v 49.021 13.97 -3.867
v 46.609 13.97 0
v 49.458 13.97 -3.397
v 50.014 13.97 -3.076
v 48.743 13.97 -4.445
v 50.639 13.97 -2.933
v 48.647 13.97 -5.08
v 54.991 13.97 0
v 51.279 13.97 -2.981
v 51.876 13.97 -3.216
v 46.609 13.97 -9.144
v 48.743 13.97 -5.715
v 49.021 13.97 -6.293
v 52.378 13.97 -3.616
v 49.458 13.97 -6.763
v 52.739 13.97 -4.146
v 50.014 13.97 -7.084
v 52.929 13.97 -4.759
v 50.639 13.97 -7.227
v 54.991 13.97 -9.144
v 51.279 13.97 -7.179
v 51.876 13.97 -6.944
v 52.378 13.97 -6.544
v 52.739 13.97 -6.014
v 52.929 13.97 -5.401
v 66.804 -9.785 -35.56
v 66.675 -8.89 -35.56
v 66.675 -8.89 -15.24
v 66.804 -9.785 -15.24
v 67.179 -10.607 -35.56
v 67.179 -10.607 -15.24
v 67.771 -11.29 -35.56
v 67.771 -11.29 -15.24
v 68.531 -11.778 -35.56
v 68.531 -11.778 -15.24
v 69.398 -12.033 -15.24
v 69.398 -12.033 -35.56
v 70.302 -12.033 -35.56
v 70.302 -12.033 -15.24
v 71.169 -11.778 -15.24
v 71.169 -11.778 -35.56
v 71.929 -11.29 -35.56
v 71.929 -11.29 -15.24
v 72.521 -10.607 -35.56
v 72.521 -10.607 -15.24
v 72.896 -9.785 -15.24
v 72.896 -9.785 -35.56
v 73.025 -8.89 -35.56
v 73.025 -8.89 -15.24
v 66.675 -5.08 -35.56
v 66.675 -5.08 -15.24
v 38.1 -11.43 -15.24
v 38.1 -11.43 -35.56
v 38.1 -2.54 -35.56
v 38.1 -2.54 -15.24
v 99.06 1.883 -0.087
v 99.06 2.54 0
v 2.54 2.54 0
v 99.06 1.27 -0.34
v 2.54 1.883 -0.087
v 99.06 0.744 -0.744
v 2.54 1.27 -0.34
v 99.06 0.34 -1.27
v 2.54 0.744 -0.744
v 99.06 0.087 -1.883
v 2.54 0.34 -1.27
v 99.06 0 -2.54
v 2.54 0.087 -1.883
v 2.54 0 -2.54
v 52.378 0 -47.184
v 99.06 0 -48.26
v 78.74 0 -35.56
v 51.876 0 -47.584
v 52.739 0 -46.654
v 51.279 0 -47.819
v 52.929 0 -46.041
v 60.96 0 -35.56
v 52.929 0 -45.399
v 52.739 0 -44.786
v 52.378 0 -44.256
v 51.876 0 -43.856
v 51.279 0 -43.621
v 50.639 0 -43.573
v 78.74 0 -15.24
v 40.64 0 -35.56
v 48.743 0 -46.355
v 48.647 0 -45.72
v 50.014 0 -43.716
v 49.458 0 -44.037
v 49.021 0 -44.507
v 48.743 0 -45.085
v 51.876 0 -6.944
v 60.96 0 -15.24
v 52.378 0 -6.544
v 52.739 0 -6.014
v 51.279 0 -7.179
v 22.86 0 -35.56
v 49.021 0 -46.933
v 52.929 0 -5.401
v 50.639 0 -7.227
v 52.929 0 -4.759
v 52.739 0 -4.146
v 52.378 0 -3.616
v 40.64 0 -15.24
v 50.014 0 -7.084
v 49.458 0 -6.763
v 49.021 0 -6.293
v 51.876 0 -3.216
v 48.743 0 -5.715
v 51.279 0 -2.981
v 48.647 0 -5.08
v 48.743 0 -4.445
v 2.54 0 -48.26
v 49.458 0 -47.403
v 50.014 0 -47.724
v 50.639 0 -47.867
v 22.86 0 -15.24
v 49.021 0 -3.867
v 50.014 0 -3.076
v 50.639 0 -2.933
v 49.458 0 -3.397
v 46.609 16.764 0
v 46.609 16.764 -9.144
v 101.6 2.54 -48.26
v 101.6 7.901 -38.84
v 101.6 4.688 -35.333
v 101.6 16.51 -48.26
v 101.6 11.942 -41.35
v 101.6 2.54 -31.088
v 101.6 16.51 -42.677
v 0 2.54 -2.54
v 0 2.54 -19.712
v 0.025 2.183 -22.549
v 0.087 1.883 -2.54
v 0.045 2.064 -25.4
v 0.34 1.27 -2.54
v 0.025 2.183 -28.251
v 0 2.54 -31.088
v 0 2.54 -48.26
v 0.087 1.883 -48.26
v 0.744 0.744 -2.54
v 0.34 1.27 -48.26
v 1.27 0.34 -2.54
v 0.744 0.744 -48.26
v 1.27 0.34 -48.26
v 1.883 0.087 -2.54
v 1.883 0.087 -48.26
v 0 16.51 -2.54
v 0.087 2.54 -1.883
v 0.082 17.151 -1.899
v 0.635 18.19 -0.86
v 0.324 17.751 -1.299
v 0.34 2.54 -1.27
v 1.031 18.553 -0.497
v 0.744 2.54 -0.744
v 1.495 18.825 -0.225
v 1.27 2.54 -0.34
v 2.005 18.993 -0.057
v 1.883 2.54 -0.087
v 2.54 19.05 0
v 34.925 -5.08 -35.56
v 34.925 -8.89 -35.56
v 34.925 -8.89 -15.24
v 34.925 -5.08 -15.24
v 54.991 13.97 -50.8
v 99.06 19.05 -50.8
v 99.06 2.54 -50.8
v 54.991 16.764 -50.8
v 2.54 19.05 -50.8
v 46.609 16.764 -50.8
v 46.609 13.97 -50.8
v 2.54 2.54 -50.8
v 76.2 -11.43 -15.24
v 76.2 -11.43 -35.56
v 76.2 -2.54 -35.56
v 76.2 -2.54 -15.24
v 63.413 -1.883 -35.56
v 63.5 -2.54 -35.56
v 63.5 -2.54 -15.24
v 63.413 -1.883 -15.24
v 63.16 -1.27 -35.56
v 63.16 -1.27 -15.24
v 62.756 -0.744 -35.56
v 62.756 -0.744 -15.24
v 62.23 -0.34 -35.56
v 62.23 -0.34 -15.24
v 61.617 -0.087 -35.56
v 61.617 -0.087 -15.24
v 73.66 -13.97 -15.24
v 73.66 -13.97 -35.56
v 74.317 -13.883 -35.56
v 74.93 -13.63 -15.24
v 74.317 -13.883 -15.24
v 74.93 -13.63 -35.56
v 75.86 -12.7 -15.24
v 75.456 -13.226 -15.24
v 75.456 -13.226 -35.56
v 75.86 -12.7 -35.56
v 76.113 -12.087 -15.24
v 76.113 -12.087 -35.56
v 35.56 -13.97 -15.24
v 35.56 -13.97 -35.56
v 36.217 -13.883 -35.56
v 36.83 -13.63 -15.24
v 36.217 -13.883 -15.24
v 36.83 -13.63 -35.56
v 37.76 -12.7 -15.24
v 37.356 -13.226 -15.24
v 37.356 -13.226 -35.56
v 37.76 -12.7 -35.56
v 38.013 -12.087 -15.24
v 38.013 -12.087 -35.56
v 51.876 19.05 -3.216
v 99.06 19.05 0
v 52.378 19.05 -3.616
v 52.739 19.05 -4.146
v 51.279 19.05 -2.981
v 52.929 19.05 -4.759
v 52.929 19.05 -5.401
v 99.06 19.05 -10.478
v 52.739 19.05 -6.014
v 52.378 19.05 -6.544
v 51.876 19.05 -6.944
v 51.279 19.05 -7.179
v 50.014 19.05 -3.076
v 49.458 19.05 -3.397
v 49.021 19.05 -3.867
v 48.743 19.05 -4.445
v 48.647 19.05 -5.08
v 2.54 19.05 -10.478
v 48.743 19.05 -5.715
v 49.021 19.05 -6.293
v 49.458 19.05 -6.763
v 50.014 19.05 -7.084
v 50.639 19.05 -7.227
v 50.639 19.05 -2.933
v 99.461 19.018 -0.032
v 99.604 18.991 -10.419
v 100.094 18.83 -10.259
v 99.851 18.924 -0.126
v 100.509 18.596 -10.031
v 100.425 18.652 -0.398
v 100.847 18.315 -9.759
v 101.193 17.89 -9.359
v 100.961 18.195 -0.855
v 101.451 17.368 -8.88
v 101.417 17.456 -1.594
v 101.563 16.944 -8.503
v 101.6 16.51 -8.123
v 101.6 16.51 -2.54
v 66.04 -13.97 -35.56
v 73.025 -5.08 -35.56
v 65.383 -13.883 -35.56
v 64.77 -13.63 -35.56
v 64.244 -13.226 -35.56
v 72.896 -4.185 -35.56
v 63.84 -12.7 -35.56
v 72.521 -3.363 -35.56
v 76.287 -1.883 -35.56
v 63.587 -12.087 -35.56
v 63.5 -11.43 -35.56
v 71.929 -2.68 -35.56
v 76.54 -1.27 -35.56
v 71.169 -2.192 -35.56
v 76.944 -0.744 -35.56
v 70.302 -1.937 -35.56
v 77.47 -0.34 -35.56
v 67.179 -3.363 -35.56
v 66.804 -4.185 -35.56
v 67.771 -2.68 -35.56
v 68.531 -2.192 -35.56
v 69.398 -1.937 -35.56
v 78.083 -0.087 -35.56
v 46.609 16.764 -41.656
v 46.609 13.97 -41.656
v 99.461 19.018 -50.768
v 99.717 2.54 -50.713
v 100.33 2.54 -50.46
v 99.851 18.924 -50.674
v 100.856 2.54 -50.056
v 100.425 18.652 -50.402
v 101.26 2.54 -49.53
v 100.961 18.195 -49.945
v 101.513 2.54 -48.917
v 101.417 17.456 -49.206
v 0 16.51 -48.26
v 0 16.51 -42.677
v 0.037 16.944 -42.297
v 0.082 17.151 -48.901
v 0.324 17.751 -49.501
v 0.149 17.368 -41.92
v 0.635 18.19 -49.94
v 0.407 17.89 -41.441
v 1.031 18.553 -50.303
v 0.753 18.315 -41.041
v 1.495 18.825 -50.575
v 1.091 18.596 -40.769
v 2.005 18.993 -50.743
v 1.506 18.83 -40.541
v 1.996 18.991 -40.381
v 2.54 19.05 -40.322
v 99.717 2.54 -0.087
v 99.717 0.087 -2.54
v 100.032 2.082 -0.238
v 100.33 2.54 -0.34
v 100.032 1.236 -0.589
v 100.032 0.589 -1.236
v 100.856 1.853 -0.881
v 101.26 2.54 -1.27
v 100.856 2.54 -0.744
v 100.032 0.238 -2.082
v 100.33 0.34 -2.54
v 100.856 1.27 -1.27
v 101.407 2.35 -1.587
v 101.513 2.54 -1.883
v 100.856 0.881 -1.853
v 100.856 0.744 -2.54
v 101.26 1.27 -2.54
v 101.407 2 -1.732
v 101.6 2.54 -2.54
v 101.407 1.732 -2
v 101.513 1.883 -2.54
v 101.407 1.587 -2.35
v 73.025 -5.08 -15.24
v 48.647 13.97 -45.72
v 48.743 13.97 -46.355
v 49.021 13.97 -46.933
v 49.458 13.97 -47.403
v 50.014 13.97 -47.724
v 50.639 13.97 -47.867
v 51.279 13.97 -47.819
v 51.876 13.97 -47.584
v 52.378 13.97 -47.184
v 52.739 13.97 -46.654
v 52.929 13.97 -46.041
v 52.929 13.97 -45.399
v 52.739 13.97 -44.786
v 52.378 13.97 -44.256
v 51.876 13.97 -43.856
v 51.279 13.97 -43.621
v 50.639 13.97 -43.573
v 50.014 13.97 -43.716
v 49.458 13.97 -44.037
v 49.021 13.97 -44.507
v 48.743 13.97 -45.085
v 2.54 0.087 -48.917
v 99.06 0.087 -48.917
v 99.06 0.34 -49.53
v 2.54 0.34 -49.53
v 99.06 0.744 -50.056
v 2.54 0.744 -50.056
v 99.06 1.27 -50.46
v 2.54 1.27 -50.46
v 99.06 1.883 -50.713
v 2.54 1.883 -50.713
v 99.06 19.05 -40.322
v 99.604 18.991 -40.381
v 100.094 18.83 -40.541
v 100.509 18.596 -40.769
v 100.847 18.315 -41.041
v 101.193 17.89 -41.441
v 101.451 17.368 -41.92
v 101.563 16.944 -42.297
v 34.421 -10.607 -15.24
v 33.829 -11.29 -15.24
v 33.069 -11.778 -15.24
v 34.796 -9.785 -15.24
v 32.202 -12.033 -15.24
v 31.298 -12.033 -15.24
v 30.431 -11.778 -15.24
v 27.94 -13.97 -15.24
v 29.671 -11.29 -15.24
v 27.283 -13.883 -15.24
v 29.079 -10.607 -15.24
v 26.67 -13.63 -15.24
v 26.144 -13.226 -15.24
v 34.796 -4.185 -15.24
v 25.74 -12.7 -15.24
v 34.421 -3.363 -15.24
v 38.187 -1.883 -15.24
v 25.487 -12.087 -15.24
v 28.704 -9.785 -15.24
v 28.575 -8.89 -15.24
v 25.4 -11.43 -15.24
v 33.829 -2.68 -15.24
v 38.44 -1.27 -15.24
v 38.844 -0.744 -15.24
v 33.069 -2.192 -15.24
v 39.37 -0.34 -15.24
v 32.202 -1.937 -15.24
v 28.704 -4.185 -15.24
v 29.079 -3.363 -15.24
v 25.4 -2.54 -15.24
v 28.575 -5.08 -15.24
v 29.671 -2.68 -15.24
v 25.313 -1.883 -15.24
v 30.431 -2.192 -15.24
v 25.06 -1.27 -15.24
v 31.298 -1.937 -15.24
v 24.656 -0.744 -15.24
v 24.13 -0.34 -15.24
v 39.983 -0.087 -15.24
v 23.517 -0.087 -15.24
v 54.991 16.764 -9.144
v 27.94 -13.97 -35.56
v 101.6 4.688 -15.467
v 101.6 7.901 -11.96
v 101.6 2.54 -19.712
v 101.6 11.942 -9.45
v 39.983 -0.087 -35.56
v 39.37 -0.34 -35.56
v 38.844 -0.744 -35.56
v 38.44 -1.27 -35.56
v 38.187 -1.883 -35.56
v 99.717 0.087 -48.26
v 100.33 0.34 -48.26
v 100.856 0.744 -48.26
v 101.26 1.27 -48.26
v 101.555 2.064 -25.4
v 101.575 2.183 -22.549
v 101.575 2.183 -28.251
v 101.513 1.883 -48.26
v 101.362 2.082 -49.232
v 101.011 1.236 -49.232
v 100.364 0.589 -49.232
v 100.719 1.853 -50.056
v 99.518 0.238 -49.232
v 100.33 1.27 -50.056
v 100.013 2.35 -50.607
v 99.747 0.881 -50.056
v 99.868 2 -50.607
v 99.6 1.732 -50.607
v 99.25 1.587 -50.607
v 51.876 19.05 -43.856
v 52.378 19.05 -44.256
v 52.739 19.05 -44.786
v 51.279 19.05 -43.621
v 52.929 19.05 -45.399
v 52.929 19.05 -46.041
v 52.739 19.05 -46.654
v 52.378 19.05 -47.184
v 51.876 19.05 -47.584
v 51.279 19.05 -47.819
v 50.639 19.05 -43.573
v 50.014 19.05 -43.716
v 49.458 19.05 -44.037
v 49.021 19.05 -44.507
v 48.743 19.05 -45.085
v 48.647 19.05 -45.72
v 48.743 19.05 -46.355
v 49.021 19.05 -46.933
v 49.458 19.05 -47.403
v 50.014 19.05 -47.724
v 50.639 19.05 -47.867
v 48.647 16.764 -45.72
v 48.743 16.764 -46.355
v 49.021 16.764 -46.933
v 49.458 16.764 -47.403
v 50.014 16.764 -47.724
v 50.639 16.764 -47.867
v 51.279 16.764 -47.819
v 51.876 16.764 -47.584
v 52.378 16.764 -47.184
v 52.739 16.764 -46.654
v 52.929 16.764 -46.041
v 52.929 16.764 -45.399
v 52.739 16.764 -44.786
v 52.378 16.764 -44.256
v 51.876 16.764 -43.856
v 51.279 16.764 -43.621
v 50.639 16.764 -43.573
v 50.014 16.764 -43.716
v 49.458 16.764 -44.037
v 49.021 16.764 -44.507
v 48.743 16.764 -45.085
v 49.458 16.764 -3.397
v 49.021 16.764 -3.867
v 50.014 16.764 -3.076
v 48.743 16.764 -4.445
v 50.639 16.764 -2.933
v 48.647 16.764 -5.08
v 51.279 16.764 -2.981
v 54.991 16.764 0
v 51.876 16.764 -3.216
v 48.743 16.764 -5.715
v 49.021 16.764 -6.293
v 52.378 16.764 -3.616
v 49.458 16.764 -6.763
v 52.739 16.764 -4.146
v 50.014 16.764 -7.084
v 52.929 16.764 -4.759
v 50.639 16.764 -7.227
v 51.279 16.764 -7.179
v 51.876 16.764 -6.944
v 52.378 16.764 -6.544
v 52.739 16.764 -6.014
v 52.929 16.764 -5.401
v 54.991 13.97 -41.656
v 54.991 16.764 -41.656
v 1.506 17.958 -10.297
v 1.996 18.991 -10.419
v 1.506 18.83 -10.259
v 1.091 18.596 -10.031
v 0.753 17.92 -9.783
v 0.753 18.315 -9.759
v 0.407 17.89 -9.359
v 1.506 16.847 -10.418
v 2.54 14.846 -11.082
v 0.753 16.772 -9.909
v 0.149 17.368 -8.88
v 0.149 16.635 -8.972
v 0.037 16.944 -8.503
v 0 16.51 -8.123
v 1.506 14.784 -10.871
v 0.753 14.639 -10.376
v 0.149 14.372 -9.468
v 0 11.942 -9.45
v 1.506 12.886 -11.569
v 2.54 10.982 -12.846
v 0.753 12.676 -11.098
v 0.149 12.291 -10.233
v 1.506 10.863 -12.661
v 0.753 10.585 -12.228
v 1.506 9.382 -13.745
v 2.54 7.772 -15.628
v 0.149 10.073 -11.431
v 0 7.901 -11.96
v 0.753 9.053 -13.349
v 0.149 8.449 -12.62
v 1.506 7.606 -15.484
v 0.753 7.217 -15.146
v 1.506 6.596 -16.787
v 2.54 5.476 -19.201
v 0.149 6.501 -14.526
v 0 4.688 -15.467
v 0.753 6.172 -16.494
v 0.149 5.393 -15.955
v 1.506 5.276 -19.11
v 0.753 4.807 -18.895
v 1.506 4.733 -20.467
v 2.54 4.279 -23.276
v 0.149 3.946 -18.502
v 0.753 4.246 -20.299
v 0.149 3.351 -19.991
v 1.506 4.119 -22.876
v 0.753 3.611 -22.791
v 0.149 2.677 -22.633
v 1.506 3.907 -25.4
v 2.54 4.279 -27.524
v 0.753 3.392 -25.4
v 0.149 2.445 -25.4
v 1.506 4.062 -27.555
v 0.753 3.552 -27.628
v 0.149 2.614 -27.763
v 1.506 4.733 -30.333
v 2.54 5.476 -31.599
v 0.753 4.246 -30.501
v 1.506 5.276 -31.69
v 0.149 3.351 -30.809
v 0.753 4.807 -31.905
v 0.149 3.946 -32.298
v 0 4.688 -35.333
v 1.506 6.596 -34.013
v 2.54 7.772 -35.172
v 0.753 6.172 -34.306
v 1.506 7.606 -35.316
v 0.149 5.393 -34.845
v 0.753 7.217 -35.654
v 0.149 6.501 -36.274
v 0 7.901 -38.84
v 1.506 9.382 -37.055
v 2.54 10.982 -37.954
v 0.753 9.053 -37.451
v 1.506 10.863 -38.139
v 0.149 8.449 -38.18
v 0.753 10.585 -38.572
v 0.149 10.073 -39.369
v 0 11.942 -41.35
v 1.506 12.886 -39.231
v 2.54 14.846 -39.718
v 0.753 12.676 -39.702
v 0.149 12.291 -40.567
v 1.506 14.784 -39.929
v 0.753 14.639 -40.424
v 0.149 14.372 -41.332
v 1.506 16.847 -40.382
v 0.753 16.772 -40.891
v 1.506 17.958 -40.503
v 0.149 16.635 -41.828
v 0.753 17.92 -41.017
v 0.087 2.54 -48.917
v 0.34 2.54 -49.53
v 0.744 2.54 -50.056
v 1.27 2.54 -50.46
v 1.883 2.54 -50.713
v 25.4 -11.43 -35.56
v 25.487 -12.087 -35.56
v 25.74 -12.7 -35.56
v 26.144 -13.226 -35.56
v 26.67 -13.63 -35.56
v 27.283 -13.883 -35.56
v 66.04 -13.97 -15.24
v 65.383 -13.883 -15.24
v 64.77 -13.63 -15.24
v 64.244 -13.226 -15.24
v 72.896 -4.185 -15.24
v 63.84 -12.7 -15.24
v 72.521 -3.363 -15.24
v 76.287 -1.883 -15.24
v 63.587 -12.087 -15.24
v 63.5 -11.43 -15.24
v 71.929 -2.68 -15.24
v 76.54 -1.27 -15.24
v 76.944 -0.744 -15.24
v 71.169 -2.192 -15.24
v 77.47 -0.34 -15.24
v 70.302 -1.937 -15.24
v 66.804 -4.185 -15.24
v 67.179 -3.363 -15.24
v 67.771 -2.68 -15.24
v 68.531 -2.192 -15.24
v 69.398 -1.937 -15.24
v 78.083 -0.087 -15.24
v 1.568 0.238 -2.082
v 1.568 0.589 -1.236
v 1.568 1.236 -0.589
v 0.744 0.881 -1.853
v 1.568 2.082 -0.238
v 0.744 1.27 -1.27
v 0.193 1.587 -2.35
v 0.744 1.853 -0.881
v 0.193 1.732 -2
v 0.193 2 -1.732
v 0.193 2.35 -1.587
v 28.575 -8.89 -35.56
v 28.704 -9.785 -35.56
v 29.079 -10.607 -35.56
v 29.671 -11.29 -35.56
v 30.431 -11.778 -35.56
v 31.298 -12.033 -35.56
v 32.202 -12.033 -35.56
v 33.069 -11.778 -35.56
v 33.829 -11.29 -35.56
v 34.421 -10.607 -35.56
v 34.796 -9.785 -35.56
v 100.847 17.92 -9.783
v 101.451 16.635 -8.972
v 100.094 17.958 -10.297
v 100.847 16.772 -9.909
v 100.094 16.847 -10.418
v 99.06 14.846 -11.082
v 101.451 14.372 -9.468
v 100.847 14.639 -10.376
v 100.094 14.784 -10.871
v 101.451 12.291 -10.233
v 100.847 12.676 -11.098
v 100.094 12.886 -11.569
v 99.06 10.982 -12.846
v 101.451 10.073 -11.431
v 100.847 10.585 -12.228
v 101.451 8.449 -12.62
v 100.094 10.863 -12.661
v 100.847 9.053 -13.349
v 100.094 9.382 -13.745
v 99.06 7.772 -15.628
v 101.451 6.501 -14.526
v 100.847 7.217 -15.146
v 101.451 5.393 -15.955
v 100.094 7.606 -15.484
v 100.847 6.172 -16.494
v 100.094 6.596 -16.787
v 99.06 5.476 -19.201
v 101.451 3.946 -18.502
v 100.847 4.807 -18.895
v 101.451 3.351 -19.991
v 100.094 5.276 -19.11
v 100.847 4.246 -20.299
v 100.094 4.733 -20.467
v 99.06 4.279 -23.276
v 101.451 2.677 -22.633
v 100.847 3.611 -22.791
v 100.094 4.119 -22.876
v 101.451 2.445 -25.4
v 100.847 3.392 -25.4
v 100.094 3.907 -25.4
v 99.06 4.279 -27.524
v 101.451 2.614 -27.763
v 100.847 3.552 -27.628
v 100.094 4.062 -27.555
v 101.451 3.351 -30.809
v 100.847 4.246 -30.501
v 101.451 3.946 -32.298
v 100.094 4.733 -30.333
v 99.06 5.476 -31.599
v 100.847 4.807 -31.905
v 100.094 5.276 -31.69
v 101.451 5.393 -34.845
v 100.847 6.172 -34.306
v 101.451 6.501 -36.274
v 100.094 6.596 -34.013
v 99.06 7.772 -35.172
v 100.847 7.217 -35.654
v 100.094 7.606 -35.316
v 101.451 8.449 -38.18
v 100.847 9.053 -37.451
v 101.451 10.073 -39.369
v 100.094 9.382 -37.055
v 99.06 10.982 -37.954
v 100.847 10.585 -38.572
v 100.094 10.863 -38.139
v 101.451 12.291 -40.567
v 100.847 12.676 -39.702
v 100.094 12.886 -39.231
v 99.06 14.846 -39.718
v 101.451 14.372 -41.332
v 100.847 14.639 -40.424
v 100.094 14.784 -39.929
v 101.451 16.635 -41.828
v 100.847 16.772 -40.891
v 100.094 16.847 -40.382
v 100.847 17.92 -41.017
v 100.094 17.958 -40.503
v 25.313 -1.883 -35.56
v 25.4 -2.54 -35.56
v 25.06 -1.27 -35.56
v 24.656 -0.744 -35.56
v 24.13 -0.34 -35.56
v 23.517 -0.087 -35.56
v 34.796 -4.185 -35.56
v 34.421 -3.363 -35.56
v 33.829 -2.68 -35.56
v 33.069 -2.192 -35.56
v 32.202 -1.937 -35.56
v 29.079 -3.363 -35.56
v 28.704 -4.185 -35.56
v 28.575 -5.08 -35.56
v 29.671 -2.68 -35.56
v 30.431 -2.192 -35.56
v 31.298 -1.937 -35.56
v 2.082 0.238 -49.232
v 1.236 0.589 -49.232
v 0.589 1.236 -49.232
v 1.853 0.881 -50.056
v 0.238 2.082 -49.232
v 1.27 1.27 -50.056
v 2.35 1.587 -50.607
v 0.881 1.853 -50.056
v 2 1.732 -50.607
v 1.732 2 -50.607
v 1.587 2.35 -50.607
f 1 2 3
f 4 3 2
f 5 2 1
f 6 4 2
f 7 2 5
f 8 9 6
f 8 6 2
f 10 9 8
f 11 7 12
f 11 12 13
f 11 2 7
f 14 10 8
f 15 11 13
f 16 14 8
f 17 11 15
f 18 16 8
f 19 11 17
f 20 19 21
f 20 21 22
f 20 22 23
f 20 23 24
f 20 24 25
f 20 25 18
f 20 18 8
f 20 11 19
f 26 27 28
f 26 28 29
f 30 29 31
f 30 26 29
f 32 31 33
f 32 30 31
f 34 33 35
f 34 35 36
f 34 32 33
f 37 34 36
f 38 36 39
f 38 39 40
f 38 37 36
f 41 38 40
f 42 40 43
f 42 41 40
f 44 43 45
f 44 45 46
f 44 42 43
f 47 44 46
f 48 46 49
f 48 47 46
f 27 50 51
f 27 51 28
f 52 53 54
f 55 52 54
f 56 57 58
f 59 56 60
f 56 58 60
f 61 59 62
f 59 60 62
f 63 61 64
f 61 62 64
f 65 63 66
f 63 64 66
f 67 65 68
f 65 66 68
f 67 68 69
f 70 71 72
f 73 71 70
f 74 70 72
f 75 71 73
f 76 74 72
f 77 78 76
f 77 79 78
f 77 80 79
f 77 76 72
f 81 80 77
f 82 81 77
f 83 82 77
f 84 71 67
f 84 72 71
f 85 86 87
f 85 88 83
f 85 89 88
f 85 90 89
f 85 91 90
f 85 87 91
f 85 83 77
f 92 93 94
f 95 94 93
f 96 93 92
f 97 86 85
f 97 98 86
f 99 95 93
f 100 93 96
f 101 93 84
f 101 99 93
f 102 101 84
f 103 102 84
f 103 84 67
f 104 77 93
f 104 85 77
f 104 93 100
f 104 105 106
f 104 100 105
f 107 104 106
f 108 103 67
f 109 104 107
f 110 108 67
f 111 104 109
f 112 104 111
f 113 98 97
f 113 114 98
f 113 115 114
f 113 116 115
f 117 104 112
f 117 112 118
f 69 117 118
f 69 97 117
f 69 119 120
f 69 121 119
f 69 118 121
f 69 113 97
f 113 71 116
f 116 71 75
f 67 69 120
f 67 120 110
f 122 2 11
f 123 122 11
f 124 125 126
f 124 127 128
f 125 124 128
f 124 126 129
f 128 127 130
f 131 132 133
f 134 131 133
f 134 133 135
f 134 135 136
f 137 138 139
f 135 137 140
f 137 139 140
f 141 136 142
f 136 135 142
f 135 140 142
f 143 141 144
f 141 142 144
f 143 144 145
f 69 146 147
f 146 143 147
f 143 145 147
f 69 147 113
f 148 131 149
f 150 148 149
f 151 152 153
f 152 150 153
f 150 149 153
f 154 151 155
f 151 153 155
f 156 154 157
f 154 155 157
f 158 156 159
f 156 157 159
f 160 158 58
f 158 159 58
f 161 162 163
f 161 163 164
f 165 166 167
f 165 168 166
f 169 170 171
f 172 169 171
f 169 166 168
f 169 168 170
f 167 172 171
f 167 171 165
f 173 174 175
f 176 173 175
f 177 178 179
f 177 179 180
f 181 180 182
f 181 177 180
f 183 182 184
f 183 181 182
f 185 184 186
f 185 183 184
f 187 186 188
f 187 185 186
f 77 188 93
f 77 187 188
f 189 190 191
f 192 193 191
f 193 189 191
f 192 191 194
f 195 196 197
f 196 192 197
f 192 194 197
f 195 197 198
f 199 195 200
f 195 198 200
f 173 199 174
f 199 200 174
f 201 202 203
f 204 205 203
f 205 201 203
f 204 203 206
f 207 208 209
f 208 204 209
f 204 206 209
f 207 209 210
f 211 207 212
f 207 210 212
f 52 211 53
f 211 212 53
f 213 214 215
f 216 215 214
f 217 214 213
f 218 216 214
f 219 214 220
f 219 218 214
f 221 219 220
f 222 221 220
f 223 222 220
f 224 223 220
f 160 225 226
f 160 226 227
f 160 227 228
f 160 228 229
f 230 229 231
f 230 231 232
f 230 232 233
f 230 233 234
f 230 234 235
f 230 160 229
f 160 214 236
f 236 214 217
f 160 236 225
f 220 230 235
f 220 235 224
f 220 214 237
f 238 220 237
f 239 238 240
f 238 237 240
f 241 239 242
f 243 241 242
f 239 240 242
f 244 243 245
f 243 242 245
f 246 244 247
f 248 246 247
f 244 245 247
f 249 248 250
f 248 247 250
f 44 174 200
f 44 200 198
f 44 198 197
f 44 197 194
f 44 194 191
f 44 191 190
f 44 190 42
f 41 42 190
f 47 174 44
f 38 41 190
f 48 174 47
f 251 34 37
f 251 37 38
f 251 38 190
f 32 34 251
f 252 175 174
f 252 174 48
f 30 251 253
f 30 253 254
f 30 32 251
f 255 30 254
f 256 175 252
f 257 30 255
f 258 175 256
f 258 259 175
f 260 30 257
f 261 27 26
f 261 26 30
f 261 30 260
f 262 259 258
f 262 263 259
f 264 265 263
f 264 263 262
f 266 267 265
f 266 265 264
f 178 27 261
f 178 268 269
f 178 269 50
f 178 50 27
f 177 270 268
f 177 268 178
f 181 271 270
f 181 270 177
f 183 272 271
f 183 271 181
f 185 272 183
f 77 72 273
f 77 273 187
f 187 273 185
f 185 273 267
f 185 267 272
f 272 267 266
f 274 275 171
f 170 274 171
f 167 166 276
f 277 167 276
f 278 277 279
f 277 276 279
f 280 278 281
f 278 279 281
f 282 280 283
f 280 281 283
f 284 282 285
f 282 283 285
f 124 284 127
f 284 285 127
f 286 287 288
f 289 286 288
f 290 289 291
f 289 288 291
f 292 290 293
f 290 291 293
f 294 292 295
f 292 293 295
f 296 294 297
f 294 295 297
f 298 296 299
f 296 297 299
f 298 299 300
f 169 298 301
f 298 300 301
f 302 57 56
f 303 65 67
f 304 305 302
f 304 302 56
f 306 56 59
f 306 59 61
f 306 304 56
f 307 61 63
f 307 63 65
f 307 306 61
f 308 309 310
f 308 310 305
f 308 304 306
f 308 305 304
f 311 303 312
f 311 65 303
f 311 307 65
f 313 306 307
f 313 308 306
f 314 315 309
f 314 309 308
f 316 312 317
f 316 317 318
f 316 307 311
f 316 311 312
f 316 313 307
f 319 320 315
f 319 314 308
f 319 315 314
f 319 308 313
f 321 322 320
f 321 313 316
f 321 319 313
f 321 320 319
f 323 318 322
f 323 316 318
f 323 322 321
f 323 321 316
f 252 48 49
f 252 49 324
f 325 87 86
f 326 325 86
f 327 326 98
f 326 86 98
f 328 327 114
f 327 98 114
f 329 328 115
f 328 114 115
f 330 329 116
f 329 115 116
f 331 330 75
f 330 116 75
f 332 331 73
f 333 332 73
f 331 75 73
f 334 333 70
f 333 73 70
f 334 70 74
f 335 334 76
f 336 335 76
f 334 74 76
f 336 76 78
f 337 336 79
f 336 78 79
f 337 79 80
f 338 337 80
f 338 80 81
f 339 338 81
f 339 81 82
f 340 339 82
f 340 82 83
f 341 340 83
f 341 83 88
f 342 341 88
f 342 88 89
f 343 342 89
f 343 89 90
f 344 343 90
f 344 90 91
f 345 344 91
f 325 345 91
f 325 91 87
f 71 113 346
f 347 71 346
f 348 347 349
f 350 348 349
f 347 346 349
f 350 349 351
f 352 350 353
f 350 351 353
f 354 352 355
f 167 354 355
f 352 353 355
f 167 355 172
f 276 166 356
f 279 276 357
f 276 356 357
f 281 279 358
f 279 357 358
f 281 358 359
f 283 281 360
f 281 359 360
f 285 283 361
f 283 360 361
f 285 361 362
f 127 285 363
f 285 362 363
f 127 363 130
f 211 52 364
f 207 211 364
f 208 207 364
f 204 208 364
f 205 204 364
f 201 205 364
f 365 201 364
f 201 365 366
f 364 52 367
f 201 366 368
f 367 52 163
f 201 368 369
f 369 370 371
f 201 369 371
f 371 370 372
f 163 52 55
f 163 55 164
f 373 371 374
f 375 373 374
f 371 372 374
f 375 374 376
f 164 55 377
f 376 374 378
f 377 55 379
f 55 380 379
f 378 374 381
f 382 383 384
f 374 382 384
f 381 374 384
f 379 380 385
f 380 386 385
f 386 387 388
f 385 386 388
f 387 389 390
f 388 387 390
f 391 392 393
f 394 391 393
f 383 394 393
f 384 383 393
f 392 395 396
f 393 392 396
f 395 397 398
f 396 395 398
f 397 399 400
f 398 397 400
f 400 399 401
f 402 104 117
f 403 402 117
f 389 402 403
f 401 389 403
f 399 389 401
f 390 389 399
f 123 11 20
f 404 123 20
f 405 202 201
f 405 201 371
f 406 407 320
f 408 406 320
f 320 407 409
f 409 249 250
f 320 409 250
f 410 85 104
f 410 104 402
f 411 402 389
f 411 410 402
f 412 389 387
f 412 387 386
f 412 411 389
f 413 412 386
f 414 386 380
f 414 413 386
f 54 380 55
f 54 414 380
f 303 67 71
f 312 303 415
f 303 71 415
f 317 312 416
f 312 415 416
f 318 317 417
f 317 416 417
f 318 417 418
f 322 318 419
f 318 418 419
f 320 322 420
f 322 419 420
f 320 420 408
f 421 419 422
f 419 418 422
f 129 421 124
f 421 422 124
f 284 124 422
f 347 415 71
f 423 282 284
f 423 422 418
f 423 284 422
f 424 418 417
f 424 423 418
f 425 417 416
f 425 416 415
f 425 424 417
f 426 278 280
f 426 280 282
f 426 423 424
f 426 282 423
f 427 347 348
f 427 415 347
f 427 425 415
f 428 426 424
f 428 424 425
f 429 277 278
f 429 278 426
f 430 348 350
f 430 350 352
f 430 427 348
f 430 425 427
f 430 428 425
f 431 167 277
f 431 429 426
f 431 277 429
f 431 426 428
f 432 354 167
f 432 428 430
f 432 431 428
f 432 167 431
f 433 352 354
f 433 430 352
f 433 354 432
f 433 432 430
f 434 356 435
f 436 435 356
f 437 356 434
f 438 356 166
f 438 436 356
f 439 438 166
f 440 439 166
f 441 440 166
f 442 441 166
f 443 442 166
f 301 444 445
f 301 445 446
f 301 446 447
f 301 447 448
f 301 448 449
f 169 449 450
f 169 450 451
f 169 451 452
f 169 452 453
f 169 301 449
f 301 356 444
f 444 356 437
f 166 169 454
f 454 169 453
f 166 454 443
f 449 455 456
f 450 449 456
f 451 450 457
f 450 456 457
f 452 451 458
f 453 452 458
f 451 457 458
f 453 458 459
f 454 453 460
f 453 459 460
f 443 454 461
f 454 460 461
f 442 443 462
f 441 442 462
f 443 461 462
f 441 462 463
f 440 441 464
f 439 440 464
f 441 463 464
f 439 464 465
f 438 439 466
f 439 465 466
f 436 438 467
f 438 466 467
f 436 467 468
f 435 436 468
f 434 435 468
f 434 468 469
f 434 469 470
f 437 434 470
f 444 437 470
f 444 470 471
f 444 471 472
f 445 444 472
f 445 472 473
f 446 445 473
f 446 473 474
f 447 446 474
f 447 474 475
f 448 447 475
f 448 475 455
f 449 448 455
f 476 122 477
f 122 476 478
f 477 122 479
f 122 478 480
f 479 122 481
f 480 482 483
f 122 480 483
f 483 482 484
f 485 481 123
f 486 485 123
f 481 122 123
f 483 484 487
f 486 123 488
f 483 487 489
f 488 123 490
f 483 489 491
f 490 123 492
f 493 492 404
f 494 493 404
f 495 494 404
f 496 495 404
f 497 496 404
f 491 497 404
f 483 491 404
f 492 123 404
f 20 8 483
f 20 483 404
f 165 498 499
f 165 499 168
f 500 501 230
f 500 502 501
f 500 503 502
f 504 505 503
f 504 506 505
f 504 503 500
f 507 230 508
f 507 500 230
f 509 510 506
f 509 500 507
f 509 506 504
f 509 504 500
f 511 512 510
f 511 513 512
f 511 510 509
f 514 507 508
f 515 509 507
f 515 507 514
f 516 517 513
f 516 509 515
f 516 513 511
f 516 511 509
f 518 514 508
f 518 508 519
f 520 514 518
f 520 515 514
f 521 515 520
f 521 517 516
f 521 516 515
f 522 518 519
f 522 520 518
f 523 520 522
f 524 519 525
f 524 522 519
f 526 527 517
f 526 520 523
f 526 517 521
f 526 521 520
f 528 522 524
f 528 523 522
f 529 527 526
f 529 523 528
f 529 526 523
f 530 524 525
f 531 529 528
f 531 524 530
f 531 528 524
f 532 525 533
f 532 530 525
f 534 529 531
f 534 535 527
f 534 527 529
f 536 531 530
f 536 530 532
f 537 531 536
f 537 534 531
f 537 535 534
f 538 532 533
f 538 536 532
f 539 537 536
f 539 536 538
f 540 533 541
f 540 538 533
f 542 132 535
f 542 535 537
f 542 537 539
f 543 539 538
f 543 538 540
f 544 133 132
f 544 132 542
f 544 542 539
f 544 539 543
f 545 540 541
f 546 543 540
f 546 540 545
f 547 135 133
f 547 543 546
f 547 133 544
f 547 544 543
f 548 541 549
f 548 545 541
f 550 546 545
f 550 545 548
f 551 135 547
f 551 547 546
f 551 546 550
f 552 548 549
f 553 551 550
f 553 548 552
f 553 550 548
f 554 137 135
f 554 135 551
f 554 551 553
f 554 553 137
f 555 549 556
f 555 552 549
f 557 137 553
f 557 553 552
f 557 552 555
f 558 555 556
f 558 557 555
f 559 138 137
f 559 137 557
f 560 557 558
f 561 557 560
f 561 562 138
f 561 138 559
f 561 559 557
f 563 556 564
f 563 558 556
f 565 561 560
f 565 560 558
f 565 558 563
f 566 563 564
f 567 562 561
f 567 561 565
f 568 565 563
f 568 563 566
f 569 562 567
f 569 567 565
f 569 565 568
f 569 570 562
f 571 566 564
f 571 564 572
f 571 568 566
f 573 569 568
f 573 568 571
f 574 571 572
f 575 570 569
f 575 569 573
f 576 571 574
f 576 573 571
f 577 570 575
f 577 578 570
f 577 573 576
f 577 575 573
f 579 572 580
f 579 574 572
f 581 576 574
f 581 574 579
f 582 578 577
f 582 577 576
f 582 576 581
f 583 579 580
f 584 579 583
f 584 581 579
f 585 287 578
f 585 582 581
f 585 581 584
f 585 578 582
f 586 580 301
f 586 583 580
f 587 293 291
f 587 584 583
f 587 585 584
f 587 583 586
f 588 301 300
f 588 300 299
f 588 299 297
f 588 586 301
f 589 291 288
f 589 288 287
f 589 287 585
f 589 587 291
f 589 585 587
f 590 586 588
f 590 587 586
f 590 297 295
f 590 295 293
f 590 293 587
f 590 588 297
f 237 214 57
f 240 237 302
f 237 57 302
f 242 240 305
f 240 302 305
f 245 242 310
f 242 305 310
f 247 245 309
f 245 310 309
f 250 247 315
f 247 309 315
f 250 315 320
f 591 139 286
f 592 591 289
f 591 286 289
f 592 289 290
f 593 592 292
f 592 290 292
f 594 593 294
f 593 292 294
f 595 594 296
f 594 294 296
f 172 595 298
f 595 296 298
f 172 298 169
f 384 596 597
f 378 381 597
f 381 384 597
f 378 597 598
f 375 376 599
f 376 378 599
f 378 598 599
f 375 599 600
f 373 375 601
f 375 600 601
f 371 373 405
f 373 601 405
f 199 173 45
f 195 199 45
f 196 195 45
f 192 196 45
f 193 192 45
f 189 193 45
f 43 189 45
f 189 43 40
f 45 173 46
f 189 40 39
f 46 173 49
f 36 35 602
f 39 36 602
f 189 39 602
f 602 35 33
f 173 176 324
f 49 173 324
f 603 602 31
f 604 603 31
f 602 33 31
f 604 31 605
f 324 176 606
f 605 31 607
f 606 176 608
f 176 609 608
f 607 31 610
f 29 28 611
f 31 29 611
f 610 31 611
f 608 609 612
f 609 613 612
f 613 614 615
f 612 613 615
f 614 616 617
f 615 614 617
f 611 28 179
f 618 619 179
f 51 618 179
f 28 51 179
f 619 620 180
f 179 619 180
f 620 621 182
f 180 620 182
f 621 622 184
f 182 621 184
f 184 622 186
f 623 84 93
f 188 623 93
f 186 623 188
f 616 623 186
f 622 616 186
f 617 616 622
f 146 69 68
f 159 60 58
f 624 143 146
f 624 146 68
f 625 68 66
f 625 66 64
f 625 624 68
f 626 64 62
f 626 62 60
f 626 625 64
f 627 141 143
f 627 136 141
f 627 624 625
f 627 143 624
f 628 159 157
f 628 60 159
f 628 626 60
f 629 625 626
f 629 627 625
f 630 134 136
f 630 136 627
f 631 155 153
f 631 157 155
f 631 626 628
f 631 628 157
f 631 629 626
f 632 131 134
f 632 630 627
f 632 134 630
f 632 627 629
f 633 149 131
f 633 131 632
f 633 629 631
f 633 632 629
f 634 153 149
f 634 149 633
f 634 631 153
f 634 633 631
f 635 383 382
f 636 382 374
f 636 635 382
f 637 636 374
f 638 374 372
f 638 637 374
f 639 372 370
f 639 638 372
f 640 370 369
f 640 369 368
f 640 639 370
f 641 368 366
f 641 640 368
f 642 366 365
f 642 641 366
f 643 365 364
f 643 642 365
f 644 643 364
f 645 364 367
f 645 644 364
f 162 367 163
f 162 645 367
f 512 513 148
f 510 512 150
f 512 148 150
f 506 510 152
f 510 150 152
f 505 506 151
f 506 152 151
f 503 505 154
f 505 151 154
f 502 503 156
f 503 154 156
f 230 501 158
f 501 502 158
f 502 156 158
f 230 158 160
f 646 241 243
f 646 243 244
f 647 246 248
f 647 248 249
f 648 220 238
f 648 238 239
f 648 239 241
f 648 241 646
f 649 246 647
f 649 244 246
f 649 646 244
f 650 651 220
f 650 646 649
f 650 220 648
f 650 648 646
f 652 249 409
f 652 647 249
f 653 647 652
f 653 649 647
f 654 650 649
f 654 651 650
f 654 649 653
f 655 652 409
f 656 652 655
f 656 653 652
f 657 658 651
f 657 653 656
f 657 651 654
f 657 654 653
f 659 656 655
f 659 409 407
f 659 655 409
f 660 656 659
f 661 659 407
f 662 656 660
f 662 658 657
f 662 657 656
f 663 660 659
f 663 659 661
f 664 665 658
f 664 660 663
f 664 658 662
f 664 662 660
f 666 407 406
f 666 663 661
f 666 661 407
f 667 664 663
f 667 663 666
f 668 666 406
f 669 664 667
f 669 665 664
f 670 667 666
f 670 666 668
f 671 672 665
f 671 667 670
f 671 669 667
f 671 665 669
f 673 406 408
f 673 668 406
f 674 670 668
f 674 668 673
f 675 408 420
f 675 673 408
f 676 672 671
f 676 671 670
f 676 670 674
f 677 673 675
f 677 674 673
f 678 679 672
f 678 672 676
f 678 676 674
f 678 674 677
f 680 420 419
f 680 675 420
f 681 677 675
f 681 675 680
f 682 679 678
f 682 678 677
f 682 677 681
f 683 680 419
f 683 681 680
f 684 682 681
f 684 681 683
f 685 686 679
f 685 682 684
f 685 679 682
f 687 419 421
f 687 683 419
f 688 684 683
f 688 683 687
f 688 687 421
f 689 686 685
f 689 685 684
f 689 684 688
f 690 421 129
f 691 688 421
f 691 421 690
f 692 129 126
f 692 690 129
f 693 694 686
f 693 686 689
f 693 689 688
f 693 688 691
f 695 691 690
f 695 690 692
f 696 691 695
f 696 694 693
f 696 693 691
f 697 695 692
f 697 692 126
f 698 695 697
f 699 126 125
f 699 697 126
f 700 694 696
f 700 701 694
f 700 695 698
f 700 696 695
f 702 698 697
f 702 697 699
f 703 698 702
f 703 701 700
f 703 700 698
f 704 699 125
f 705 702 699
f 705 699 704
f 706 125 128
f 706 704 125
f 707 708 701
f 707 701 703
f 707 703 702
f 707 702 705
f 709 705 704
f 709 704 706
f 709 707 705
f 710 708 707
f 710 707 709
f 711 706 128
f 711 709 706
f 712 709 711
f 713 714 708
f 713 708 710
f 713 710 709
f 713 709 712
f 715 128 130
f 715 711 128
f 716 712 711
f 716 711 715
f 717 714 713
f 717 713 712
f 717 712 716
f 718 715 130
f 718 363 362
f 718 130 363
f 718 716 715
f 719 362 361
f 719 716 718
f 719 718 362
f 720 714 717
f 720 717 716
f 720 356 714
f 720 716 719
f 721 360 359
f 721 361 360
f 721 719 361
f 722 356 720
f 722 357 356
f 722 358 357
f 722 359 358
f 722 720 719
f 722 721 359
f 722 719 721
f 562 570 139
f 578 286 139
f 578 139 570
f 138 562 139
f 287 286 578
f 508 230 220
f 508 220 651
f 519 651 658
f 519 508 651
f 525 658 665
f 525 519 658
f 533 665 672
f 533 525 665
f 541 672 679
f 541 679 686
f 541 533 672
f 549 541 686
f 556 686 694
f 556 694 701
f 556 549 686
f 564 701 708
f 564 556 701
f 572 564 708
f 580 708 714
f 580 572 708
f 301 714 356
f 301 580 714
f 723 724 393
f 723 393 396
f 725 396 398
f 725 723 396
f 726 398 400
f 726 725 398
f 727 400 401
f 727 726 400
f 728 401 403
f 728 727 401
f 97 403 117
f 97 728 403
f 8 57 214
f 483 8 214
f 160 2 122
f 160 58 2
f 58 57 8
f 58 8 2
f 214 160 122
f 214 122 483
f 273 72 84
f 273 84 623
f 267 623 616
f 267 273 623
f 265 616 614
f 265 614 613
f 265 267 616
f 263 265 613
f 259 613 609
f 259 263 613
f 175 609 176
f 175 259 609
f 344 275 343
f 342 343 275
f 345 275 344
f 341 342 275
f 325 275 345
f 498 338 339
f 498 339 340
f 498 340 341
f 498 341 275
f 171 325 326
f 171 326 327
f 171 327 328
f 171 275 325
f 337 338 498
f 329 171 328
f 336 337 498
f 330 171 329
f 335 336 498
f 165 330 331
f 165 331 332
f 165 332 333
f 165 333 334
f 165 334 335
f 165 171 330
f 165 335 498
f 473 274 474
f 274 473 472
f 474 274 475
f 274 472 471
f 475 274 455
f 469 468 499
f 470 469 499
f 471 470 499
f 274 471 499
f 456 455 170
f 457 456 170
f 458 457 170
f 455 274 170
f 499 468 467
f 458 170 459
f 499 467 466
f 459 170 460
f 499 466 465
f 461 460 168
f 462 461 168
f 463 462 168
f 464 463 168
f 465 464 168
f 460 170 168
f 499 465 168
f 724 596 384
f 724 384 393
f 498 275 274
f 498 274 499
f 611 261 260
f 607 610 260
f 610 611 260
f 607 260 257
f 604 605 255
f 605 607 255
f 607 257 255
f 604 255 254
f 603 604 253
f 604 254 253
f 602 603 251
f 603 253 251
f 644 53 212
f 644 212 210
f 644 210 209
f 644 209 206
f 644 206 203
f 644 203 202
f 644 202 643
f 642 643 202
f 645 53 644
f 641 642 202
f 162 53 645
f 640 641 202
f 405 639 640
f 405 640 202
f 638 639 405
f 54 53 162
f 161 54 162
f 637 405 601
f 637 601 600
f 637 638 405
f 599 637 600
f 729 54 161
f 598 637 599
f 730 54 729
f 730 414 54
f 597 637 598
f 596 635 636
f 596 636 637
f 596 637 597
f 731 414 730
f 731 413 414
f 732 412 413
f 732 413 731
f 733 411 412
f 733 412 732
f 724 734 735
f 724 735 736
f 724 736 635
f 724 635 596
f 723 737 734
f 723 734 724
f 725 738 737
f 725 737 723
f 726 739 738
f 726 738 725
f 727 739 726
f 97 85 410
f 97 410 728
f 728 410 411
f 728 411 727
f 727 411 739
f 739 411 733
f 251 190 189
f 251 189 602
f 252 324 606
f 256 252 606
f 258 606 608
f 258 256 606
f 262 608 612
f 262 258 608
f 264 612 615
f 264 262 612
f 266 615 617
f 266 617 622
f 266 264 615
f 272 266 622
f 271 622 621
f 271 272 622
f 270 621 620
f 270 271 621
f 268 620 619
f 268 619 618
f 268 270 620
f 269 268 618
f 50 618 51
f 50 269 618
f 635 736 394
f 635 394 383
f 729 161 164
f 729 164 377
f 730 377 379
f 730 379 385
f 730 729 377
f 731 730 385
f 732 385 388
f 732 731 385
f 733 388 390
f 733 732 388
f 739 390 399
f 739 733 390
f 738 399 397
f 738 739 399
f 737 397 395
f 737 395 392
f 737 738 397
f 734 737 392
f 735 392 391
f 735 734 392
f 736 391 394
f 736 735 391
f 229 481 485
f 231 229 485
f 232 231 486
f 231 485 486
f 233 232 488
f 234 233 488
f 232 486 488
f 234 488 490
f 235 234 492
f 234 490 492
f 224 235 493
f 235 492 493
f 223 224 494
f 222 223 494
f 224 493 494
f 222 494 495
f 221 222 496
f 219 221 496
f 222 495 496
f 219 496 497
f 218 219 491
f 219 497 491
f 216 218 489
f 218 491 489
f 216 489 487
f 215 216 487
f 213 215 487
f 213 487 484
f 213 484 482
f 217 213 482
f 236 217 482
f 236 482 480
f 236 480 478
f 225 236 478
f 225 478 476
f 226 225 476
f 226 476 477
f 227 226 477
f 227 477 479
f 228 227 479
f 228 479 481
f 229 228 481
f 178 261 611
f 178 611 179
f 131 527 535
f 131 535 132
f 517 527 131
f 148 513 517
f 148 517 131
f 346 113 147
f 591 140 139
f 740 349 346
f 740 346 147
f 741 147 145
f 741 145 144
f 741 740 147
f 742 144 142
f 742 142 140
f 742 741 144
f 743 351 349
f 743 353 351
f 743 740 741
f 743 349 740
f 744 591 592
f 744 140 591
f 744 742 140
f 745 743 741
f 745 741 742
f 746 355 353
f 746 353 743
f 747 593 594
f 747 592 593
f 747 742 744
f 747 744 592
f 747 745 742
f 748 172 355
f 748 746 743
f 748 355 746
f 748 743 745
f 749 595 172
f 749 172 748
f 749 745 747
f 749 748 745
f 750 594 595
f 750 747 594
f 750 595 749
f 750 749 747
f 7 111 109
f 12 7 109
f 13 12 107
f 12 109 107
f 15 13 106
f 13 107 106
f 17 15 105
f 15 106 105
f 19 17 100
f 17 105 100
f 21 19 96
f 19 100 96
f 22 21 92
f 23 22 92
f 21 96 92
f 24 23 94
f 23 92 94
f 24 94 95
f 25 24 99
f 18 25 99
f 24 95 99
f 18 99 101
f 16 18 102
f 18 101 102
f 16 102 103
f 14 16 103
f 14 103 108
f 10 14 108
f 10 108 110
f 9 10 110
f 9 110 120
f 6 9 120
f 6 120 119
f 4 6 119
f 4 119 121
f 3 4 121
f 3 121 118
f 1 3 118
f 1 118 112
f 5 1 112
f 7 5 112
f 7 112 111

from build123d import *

# Parameters (mm, degrees)
BOSS_EXTRUDE2_DEPTH   = 101.6
SKETCH14_W            = 12.7
SKETCH14_H            = 13.97
BOSS_EXTRUDE3_DEPTH   = 20.32
F_6_CLEARANCE_HOLE1_D = 4.3053
SKETCH8_W             = 8.382
SKETCH8_H             = 9.144
CUT_EXTRUDE2_DEPTH    = 2.794
FILLET1_R             = 2.54


with BuildPart() as part:
    # Sketch3 → Boss-Extrude2 (new body)
    with BuildSketch(Plane(origin=(0, 0, 0), x_dir=(0, 0, -1), z_dir=(1, 0, 0))):
        with BuildLine():
            Line((40.3225, 19.05), (50.8, 19.05))
            Line((50.8, 19.05), (50.8, 0))
            Line((50.8, 0), (0, 0))
            Line((0, 0), (0, 19.05))
            Line((0, 19.05), (10.4775, 19.05))
            ThreePointArc((10.4775, 19.05), (25.4, 4.1275), (40.3225, 19.05))
        make_face()
    extrude(amount=BOSS_EXTRUDE2_DEPTH)

    # Sketch14 → Boss-Extrude3 (add)
    # profile 1 of 2: a face of its own
    with BuildSketch(Plane(origin=(0, 0, -35.56), x_dir=(-1, 0, 0), z_dir=(0, 0, -1))):
        with Locations((-69.85, -6.985)):
            Rectangle(SKETCH14_W, SKETCH14_H)
        with BuildLine():
            Line((-66.675, -5.08), (-66.675, -8.89))
            ThreePointArc((-66.675, -8.89), (-69.85, -12.065), (-73.025, -8.89))
            Line((-73.025, -8.89), (-73.025, -5.08))
            ThreePointArc((-73.025, -5.08), (-69.85, -1.905), (-66.675, -5.08))
        make_face(mode=Mode.SUBTRACT)
    # profile 2 of 2: a face of its own
    with BuildSketch(Plane(origin=(0, 0, -35.56), x_dir=(-1, 0, 0), z_dir=(0, 0, -1))):
        with Locations((-31.75, -6.985)):
            Rectangle(SKETCH14_W, SKETCH14_H)
        with BuildLine():
            Line((-28.575, -5.08), (-28.575, -8.89))
            ThreePointArc((-28.575, -8.89), (-31.75, -12.065), (-34.925, -8.89))
            Line((-34.925, -8.89), (-34.925, -5.08))
            ThreePointArc((-34.925, -5.08), (-31.75, -1.905), (-28.575, -5.08))
        make_face(mode=Mode.SUBTRACT)
    extrude(amount=-BOSS_EXTRUDE3_DEPTH)

    # #6 Clearance Hole1 (through all)
    with Locations(Plane(origin=(0, 19.05, 0), x_dir=(1, 0, 0), z_dir=(0, 1, 0))):
        with Locations((50.8, 5.08), (50.8, 45.72)):
            Hole(F_6_CLEARANCE_HOLE1_D / 2)

    # Sketch8 → Cut-Extrude2 (cut)
    with BuildSketch(Plane(origin=(0, 13.97, 0), x_dir=(1, 0, 0), z_dir=(0, 1, 0))):
        with Locations((50.8, 4.572)):
            Rectangle(SKETCH8_W, SKETCH8_H)
        with Locations((50.8, 46.228)):
            Rectangle(SKETCH8_W, SKETCH8_H)
    extrude(amount=CUT_EXTRUDE2_DEPTH, mode=Mode.SUBTRACT)

    # Fillet1
    # the kernel refuses this fillet: 2.54 mm, written as the material it adds along each edge
    with BuildSketch(Plane(origin=(63.5, 0, -35.56), x_dir=(-1, 0, 0), z_dir=(0, 0, 1)), Plane(origin=(25.4, 0, -35.56), x_dir=(-1, 0, 0), z_dir=(0, 0, 1))) as fillet1_piece_1:
        with BuildLine():
            CenterArc((FILLET1_R, FILLET1_R), FILLET1_R, 180, 90)
            Line((0, FILLET1_R), (0, 0))
            Line((0, 0), (FILLET1_R, 0))
        make_face()
    extrude(amount=20.32)
    with BuildSketch(Plane(origin=(76.2, 0, -35.56), x_dir=(1, 0, 0), z_dir=(0, 0, 1)), Plane(origin=(38.1, 0, -35.56), x_dir=(1, 0, 0), z_dir=(0, 0, 1))) as fillet1_piece_2:
        with BuildLine():
            CenterArc((FILLET1_R, -FILLET1_R), FILLET1_R, 90, 90)
            Line((0, -FILLET1_R), (0, 0))
            Line((0, 0), (FILLET1_R, 0))
        make_face()
    extrude(amount=20.32)
    # the kernel refuses this fillet: 2.54 mm, written as the material it takes off along each edge
    with BuildSketch(Plane(origin=(2.54, 2.54, -48.26), x_dir=(-1, 0, 0), z_dir=(0, 0, -1))) as fillet1_2_piece_1_section:
        Polygon((0, 0), (FILLET1_R, 0), (FILLET1_R, -FILLET1_R), (0, -FILLET1_R), align=None)
    fillet1_2_piece_1 = extrude(amount=FILLET1_R, mode=Mode.PRIVATE)
    fillet1_2_piece_1 = fillet1_2_piece_1 - Plane(origin=(2.54, 2.54, -48.26), x_dir=(0.7071067811865475, 0.7071067811865475, 0), z_dir=(0, 0, -1)) * Sphere(FILLET1_R, mode=Mode.PRIVATE)
    add(fillet1_2_piece_1, mode=Mode.SUBTRACT)
    with BuildSketch(Plane(origin=(99.06, 2.54, -48.26), x_dir=(1, 0, 0), z_dir=(0, 0, -1))) as fillet1_2_piece_2_section:
        Polygon((0, 0), (FILLET1_R, 0), (FILLET1_R, FILLET1_R), (0, FILLET1_R), align=None)
    fillet1_2_piece_2 = extrude(amount=FILLET1_R, mode=Mode.PRIVATE)
    fillet1_2_piece_2 = fillet1_2_piece_2 - Plane(origin=(99.06, 2.54, -48.26), x_dir=(-0.7071067811865475, 0.7071067811865475, 0), z_dir=(0, 0, -1)) * Sphere(FILLET1_R, mode=Mode.PRIVATE)
    add(fillet1_2_piece_2, mode=Mode.SUBTRACT)
    with BuildSketch(Plane(origin=(2.54, 2.54, -2.54), x_dir=(0, 0, 1), z_dir=(-1, 0, 0))) as fillet1_2_piece_3_section:
        Polygon((0, 0), (FILLET1_R, 0), (FILLET1_R, -FILLET1_R), (0, -FILLET1_R), align=None)
    fillet1_2_piece_3 = extrude(amount=FILLET1_R, mode=Mode.PRIVATE)
    fillet1_2_piece_3 = fillet1_2_piece_3 - Plane(origin=(2.54, 2.54, -2.54), x_dir=(0, 0.7071067811865475, -0.7071067811865475), z_dir=(-1, 0, 0)) * Sphere(FILLET1_R, mode=Mode.PRIVATE)
    add(fillet1_2_piece_3, mode=Mode.SUBTRACT)
    with BuildSketch(Plane(origin=(99.06, 2.54, -2.54), x_dir=(0, 0, 1), z_dir=(1, 0, 0))) as fillet1_2_piece_4_section:
        Polygon((0, 0), (FILLET1_R, 0), (FILLET1_R, FILLET1_R), (0, FILLET1_R), align=None)
    fillet1_2_piece_4 = extrude(amount=FILLET1_R, mode=Mode.PRIVATE)
    fillet1_2_piece_4 = fillet1_2_piece_4 - Plane(origin=(99.06, 2.54, -2.54), x_dir=(0, 0.7071067811865475, -0.7071067811865475), z_dir=(1, 0, 0)) * Sphere(FILLET1_R, mode=Mode.PRIVATE)
    add(fillet1_2_piece_4, mode=Mode.SUBTRACT)
    with BuildSketch(Plane(origin=(2.54, 0, -50.8), x_dir=(0, 0, 1), z_dir=(1, 0, 0))) as fillet1_2_piece_5:
        with BuildLine():
            CenterArc((FILLET1_R, -FILLET1_R), FILLET1_R, 90, 90)
            Line((0, -FILLET1_R), (0, 0))
            Line((0, 0), (FILLET1_R, 0))
        make_face()
    extrude(amount=96.52, mode=Mode.SUBTRACT)
    with BuildSketch(Plane(origin=(2.54, 0, 0), x_dir=(0, 0, -1), z_dir=(1, 0, 0))) as fillet1_2_piece_6:
        with BuildLine():
            CenterArc((FILLET1_R, FILLET1_R), FILLET1_R, 180, 90)
            Line((0, FILLET1_R), (0, 0))
            Line((0, 0), (FILLET1_R, 0))
        make_face()
    extrude(amount=96.52, mode=Mode.SUBTRACT)
    with BuildSketch(Plane(origin=(101.6, 25.4, -50.8), x_dir=(-1, 0, 0), z_dir=(0, -1, 0)), Plane(origin=(101.6, 2.54, 0), x_dir=(-1, 0, 0), z_dir=(0, 1, 0))) as fillet1_2_piece_7:
        with BuildLine():
            CenterArc((FILLET1_R, -FILLET1_R), FILLET1_R, 90, 90)
            Line((0, -FILLET1_R), (0, 0))
            Line((0, 0), (FILLET1_R, 0))
        make_face()
    extrude(amount=22.86, mode=Mode.SUBTRACT)
    with BuildSketch(Plane(origin=(101.6, 19.05, -33.9725), x_dir=(-1, 0, 0), z_dir=(0, 0, -1)), Plane(origin=(101.6, 19.05, 6.35), x_dir=(-1, 0, 0), z_dir=(0, 0, -1))) as fillet1_2_piece_8:
        with BuildLine():
            CenterArc((FILLET1_R, -FILLET1_R), FILLET1_R, 90, 90)
            Line((0, -FILLET1_R), (0, 0))
            Line((0, 0), (FILLET1_R, 0))
        make_face()
    extrude(amount=23.1775, mode=Mode.SUBTRACT)
    with BuildSketch(Plane(origin=(101.6, 19.05, -25.4), x_dir=(0, 0.4134285279773088, 0.9105365738148663), z_dir=(0, 0.9105365738148663, -0.4134285279773088))) as fillet1_2_piece_9:
        with BuildLine():
            CenterArc((14.9225 + FILLET1_R, -FILLET1_R), FILLET1_R, 90, 90)
            Line((14.9225, -FILLET1_R), (14.9225, 0))
            Line((14.9225, 0), (14.9225 + FILLET1_R, 0))
        make_face()
    revolve(axis=Axis((101.6, 19.05, -25.4), (1, 0, 0)), revolution_arc=228.840784647, mode=Mode.SUBTRACT)
    with BuildSketch(Plane(origin=(63.5, -13.97, -41.91), x_dir=(1, 0, 0), z_dir=(0, 0, 1)), Plane(origin=(76.2, -13.97, -41.91), x_dir=(0, 1, 0), z_dir=(0, 0, 1)), Plane(origin=(25.4, -13.97, -41.91), x_dir=(1, 0, 0), z_dir=(0, 0, 1)), Plane(origin=(38.1, -13.97, -41.91), x_dir=(0, 1, 0), z_dir=(0, 0, 1))) as fillet1_2_piece_10:
        with BuildLine():
            CenterArc((FILLET1_R, FILLET1_R), FILLET1_R, 180, 90)
            Line((0, FILLET1_R), (0, 0))
            Line((0, 0), (FILLET1_R, 0))
        make_face()
    extrude(amount=33.02, mode=Mode.SUBTRACT)
    with BuildSketch(Plane(origin=(0, 19.05, 6.35), x_dir=(1, 0, 0), z_dir=(0, 0, -1)), Plane(origin=(0, 19.05, -33.9725), x_dir=(1, 0, 0), z_dir=(0, 0, -1))) as fillet1_2_piece_11:
        with BuildLine():
            CenterArc((FILLET1_R, FILLET1_R), FILLET1_R, 180, 90)
            Line((0, FILLET1_R), (0, 0))
            Line((0, 0), (FILLET1_R, 0))
        make_face()
    extrude(amount=23.1775, mode=Mode.SUBTRACT)
    with BuildSketch(Plane(origin=(0, 19.05, -25.4), x_dir=(0, 0.4134285279773076, 0.9105365738148669), z_dir=(0, 0.9105365738148669, -0.4134285279773076))) as fillet1_2_piece_12:
        with BuildLine():
            CenterArc((14.9225 + FILLET1_R, FILLET1_R), FILLET1_R, 180, 90)
            Line((14.9225, FILLET1_R), (14.9225, 0))
            Line((14.9225, 0), (14.9225 + FILLET1_R, 0))
        make_face()
    revolve(axis=Axis((0, 19.05, -25.4), (1, 0, 0)), revolution_arc=228.840784647, mode=Mode.SUBTRACT)
    with BuildSketch(Plane(origin=(0, 25.4, -50.8), x_dir=(1, 0, 0), z_dir=(0, -1, 0)), Plane(origin=(0, 2.54, 0), x_dir=(1, 0, 0), z_dir=(0, 1, 0))) as fillet1_2_piece_13:
        with BuildLine():
            CenterArc((FILLET1_R, FILLET1_R), FILLET1_R, 180, 90)
            Line((0, FILLET1_R), (0, 0))
            Line((0, 0), (FILLET1_R, 0))
        make_face()
    extrude(amount=22.86, mode=Mode.SUBTRACT)
    with BuildSketch(Plane(origin=(0, 0, -48.26), x_dir=(1, 0, 0), z_dir=(0, 0, 1))) as fillet1_2_piece_14:
        with BuildLine():
            CenterArc((FILLET1_R, FILLET1_R), FILLET1_R, 180, 90)
            Line((0, FILLET1_R), (0, 0))
            Line((0, 0), (FILLET1_R, 0))
        make_face()
    extrude(amount=45.72, mode=Mode.SUBTRACT)
    with BuildSketch(Plane(origin=(101.6, 0, -48.26), x_dir=(-1, 0, 0), z_dir=(0, 0, 1))) as fillet1_2_piece_15:
        with BuildLine():
            CenterArc((FILLET1_R, -FILLET1_R), FILLET1_R, 90, 90)
            Line((0, -FILLET1_R), (0, 0))
            Line((0, 0), (FILLET1_R, 0))
        make_face()
    extrude(amount=45.72, mode=Mode.SUBTRACT)


solid = part.part
